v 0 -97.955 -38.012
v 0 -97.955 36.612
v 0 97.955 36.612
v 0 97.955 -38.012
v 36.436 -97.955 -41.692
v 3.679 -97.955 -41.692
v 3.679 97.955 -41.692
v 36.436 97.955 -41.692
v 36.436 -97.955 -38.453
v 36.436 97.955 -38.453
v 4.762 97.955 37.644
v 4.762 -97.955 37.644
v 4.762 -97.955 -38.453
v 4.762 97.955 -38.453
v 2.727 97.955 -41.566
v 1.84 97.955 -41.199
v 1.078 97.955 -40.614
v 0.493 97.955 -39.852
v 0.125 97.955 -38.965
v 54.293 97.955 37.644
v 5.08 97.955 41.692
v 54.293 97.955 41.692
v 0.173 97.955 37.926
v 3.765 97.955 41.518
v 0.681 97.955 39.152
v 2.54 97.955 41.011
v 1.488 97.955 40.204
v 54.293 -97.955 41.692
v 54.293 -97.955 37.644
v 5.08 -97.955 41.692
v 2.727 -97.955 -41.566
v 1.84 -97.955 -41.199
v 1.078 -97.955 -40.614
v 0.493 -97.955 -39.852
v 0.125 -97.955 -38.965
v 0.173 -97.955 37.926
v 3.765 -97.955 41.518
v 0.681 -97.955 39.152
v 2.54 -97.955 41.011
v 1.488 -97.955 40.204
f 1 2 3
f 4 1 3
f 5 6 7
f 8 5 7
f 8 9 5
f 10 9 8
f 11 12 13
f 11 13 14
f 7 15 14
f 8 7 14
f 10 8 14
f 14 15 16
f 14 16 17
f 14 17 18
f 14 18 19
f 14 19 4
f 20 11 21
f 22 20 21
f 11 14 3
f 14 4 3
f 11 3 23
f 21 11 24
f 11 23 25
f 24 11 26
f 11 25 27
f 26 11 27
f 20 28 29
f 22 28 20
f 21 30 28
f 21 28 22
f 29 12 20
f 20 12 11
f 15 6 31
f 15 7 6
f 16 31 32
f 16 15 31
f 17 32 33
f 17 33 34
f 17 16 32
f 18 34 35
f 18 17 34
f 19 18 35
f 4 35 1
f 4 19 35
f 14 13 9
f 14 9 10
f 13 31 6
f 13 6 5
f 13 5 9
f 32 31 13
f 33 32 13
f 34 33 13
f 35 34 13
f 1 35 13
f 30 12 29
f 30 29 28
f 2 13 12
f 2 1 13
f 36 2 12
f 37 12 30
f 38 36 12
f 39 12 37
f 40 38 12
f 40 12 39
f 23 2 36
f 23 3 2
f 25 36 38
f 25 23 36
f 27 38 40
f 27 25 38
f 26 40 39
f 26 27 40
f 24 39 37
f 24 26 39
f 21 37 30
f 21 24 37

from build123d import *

# Parameters (mm, degrees)
F0_W     = 195.9098130465
F0_H     = 83.3830982447
F1_DEPTH = 4.7625
F2_W     = 195.9098130465
F2_H     = 3.2381750643
F3_DEPTH = 34.8488
F4_R     = 3.6792614691
F5_DEPTH = 3.175
F6_W     = 195.9098130465
F6_H     = 4.0477178991
F7_DEPTH = 49.53
F8_R     = 5.08


with BuildPart() as f1:
    # F0 (on Right) → F1 (new body)
    with BuildSketch(Plane.YZ):
        Rectangle(F0_W, F0_H)
    extrude(amount=F1_DEPTH)

    # F2 (on face) → F3 (join)
    with BuildSketch(Plane.YZ.offset(4.7625)):
        with Locations((0, -40.0724615902)):
            Rectangle(F2_W, F2_H)
    extrude(amount=F3_DEPTH)

    # F4
    f4_edges = [f1.edges().sort_by_distance(p)[0] for p in [
        (0, 0, -41.691549),
    ]]
    fillet(f4_edges, radius=F4_R)

    # F5 (cut): a face of the model
    f5_faces = [f1.faces().sort_by_distance(p)[0] for p in [
        (39.6113, 0, -40.0724615902),
    ]]
    extrude(f5_faces, amount=-F5_DEPTH, mode=Mode.SUBTRACT)

    # F6 (on face) → F7 (join)
    with BuildSketch(Plane.YZ.offset(4.7625)):
        with Locations((0, 39.6676901728)):
            Rectangle(F6_W, F6_H)
    extrude(amount=F7_DEPTH)

    # F8
    f8_edges = [f1.edges().sort_by_distance(p)[0] for p in [
        (0, 0, 41.691549),
    ]]
    fillet(f8_edges, radius=F8_R)


solid = f1.part
